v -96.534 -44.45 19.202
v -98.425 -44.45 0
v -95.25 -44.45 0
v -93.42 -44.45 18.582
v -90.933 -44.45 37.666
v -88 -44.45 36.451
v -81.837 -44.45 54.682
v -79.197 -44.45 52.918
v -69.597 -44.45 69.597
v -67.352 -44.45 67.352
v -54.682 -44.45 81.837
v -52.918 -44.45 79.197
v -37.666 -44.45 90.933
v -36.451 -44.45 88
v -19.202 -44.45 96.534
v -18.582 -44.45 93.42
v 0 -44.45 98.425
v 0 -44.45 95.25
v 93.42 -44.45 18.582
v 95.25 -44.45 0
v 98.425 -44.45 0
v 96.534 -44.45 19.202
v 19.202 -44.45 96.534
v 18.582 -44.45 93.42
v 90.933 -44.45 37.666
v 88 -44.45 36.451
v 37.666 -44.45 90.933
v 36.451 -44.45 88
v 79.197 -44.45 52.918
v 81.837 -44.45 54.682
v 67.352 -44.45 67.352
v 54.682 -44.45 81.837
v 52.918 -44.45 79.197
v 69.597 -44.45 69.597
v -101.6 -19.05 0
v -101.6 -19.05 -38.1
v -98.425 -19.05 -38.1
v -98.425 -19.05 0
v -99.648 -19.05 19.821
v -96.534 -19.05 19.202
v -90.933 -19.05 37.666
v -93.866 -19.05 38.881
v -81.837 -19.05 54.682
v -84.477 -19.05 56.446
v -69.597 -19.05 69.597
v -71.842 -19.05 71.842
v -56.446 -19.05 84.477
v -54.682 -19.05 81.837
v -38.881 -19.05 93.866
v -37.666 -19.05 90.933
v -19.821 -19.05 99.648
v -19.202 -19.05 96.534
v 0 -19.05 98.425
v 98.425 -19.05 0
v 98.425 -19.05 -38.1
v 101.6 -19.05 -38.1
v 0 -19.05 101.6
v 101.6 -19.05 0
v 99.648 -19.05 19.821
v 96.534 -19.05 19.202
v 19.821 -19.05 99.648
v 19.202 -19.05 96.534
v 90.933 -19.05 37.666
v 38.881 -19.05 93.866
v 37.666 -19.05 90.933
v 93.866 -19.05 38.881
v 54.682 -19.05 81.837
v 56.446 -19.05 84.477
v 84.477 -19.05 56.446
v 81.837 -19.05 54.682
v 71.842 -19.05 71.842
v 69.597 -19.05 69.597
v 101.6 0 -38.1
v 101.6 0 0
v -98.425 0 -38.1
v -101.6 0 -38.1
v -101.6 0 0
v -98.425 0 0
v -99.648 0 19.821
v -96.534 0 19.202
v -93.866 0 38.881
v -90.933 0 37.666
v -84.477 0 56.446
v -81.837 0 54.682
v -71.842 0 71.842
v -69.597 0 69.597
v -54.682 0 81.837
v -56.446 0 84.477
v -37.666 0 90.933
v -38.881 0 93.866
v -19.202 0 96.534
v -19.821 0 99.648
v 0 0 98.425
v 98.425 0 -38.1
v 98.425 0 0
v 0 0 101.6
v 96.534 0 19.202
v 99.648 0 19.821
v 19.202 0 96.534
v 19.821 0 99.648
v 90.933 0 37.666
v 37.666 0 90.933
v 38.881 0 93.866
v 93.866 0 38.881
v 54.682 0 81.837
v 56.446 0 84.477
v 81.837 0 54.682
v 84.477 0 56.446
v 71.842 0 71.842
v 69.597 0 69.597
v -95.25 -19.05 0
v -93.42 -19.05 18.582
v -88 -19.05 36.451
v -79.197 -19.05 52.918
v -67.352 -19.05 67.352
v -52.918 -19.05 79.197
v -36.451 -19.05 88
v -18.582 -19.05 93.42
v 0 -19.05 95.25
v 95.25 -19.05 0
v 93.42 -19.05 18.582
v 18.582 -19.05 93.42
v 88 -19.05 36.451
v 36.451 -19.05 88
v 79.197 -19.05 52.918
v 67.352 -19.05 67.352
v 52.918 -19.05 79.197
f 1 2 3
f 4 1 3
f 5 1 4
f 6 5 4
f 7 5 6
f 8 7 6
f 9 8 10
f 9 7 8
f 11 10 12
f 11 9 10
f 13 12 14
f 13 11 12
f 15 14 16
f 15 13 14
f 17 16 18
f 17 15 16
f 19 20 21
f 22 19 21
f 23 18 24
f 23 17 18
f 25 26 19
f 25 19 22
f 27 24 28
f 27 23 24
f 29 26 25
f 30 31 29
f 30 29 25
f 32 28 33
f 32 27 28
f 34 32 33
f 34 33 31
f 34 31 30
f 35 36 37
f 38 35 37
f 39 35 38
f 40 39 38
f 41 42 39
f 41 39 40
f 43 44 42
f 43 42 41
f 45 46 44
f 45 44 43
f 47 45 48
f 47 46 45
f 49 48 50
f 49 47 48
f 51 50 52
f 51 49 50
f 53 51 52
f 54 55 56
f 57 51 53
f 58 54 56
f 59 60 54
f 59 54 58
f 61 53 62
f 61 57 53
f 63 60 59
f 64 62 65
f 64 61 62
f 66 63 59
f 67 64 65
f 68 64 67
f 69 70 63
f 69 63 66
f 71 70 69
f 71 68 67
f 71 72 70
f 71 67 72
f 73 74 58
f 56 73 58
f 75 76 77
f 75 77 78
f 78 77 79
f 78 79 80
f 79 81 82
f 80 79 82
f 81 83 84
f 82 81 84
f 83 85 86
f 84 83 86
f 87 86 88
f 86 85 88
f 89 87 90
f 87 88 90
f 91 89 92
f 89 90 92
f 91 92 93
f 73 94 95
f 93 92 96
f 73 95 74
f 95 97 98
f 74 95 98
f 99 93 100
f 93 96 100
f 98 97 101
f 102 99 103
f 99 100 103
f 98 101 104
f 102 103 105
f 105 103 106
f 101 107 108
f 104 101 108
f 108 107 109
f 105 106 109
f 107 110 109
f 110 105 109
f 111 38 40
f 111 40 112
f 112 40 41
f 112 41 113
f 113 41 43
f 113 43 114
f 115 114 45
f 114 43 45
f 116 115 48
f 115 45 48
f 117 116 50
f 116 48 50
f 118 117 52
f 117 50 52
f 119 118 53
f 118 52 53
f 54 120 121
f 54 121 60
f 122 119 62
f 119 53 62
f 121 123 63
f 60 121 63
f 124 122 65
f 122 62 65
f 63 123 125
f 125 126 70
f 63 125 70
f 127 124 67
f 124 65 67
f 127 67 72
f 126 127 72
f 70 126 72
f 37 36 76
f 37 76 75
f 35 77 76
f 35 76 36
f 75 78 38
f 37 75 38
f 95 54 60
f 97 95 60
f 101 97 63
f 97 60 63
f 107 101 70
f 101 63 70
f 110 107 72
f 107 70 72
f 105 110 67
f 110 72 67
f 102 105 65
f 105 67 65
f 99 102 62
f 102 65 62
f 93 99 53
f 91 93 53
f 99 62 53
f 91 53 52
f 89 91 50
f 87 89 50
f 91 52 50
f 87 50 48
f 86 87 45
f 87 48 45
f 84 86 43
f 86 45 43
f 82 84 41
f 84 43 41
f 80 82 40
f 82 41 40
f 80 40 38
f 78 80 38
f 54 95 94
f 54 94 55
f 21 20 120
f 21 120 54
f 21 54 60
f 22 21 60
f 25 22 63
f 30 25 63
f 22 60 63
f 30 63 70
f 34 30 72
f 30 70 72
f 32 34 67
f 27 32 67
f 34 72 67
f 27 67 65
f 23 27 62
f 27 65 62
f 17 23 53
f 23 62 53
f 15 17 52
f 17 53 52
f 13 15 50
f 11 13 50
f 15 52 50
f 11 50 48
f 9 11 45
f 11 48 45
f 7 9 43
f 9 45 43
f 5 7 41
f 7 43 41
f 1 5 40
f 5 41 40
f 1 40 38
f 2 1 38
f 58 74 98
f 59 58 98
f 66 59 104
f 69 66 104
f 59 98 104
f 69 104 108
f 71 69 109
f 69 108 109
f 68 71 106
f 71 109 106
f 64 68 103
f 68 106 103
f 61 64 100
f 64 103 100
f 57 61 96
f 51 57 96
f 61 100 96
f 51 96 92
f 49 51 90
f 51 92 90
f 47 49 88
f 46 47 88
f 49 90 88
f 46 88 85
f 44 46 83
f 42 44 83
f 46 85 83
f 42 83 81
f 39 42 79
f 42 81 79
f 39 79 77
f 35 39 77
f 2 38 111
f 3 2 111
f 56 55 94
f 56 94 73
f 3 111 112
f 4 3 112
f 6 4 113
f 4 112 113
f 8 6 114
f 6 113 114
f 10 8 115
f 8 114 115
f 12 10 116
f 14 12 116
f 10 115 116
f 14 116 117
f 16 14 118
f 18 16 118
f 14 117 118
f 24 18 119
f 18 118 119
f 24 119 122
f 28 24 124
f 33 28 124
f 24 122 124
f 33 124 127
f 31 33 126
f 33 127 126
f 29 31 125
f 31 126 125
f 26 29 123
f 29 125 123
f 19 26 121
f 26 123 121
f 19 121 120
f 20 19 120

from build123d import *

# Parameters (mm, degrees)
F1_DEPTH  = 19.05
F3_DEPTH  = 25.4
F5_DEPTH  = 25.4
F6_W      = 3.175
F6_H      = 19.05
F7_DEPTH  = 38.1
F8_W      = 3.175
F8_H      = 19.05
F9_DEPTH  = 38.1
F10_DEPTH = 25.4


with BuildPart() as f1:
    # F0 (on Front) → F1 (new body)
    with BuildSketch(Plane.XZ):
        with BuildLine():
            Line((-101.6, 0), (101.6, 0))
            ThreePointArc((101.6, 0), (0, 101.6), (-101.6, 0))
        make_face()
    extrude(amount=F1_DEPTH)

    # F2 (on face) → F3 (cut)
    with BuildSketch(Plane.XZ.offset(19.05)):
        with BuildLine():
            Line((-95.25, 0), (95.25, 0))
            ThreePointArc((95.25, 0), (0, 95.25), (-95.25, 0))
        make_face()
    extrude(amount=-F3_DEPTH, mode=Mode.SUBTRACT)

    # F4 (on face) → F5 (cut)
    with BuildSketch(Plane.XZ.offset(19.05)):
        with BuildLine():
            Line((95.25, 0), (98.425, 0))
            ThreePointArc((98.425, 0), (0, 98.425), (-98.425, 0))
            Line((-98.425, 0), (-95.25, 0))
            ThreePointArc((-95.25, 0), (0, 95.25), (95.25, 0))
        make_face()
    extrude(amount=-F5_DEPTH, mode=Mode.SUBTRACT)

    # F6 (on face) → F7 (join)
    with BuildSketch(Plane(origin=(0, 0, 0), x_dir=(1, 0, 0), z_dir=(0, 0, -1))):
        with Locations((-100.0125, 9.525)):
            Rectangle(F6_W, F6_H)
    extrude(amount=F7_DEPTH)

    # F8 (on face) → F9 (join)
    with BuildSketch(Plane(origin=(0, 0, 0), x_dir=(1, 0, 0), z_dir=(0, 0, -1))):
        with Locations((100.0125, 9.525)):
            Rectangle(F8_W, F8_H)
    extrude(amount=F9_DEPTH)

    # F4 (on face) → F10 (join)
    with BuildSketch(Plane.XZ.offset(19.05)):
        with BuildLine():
            Line((95.25, 0), (98.425, 0))
            ThreePointArc((98.425, 0), (0, 98.425), (-98.425, 0))
            Line((-98.425, 0), (-95.25, 0))
            ThreePointArc((-95.25, 0), (0, 95.25), (95.25, 0))
        make_face()
    extrude(amount=F10_DEPTH)


solid = f1.part
